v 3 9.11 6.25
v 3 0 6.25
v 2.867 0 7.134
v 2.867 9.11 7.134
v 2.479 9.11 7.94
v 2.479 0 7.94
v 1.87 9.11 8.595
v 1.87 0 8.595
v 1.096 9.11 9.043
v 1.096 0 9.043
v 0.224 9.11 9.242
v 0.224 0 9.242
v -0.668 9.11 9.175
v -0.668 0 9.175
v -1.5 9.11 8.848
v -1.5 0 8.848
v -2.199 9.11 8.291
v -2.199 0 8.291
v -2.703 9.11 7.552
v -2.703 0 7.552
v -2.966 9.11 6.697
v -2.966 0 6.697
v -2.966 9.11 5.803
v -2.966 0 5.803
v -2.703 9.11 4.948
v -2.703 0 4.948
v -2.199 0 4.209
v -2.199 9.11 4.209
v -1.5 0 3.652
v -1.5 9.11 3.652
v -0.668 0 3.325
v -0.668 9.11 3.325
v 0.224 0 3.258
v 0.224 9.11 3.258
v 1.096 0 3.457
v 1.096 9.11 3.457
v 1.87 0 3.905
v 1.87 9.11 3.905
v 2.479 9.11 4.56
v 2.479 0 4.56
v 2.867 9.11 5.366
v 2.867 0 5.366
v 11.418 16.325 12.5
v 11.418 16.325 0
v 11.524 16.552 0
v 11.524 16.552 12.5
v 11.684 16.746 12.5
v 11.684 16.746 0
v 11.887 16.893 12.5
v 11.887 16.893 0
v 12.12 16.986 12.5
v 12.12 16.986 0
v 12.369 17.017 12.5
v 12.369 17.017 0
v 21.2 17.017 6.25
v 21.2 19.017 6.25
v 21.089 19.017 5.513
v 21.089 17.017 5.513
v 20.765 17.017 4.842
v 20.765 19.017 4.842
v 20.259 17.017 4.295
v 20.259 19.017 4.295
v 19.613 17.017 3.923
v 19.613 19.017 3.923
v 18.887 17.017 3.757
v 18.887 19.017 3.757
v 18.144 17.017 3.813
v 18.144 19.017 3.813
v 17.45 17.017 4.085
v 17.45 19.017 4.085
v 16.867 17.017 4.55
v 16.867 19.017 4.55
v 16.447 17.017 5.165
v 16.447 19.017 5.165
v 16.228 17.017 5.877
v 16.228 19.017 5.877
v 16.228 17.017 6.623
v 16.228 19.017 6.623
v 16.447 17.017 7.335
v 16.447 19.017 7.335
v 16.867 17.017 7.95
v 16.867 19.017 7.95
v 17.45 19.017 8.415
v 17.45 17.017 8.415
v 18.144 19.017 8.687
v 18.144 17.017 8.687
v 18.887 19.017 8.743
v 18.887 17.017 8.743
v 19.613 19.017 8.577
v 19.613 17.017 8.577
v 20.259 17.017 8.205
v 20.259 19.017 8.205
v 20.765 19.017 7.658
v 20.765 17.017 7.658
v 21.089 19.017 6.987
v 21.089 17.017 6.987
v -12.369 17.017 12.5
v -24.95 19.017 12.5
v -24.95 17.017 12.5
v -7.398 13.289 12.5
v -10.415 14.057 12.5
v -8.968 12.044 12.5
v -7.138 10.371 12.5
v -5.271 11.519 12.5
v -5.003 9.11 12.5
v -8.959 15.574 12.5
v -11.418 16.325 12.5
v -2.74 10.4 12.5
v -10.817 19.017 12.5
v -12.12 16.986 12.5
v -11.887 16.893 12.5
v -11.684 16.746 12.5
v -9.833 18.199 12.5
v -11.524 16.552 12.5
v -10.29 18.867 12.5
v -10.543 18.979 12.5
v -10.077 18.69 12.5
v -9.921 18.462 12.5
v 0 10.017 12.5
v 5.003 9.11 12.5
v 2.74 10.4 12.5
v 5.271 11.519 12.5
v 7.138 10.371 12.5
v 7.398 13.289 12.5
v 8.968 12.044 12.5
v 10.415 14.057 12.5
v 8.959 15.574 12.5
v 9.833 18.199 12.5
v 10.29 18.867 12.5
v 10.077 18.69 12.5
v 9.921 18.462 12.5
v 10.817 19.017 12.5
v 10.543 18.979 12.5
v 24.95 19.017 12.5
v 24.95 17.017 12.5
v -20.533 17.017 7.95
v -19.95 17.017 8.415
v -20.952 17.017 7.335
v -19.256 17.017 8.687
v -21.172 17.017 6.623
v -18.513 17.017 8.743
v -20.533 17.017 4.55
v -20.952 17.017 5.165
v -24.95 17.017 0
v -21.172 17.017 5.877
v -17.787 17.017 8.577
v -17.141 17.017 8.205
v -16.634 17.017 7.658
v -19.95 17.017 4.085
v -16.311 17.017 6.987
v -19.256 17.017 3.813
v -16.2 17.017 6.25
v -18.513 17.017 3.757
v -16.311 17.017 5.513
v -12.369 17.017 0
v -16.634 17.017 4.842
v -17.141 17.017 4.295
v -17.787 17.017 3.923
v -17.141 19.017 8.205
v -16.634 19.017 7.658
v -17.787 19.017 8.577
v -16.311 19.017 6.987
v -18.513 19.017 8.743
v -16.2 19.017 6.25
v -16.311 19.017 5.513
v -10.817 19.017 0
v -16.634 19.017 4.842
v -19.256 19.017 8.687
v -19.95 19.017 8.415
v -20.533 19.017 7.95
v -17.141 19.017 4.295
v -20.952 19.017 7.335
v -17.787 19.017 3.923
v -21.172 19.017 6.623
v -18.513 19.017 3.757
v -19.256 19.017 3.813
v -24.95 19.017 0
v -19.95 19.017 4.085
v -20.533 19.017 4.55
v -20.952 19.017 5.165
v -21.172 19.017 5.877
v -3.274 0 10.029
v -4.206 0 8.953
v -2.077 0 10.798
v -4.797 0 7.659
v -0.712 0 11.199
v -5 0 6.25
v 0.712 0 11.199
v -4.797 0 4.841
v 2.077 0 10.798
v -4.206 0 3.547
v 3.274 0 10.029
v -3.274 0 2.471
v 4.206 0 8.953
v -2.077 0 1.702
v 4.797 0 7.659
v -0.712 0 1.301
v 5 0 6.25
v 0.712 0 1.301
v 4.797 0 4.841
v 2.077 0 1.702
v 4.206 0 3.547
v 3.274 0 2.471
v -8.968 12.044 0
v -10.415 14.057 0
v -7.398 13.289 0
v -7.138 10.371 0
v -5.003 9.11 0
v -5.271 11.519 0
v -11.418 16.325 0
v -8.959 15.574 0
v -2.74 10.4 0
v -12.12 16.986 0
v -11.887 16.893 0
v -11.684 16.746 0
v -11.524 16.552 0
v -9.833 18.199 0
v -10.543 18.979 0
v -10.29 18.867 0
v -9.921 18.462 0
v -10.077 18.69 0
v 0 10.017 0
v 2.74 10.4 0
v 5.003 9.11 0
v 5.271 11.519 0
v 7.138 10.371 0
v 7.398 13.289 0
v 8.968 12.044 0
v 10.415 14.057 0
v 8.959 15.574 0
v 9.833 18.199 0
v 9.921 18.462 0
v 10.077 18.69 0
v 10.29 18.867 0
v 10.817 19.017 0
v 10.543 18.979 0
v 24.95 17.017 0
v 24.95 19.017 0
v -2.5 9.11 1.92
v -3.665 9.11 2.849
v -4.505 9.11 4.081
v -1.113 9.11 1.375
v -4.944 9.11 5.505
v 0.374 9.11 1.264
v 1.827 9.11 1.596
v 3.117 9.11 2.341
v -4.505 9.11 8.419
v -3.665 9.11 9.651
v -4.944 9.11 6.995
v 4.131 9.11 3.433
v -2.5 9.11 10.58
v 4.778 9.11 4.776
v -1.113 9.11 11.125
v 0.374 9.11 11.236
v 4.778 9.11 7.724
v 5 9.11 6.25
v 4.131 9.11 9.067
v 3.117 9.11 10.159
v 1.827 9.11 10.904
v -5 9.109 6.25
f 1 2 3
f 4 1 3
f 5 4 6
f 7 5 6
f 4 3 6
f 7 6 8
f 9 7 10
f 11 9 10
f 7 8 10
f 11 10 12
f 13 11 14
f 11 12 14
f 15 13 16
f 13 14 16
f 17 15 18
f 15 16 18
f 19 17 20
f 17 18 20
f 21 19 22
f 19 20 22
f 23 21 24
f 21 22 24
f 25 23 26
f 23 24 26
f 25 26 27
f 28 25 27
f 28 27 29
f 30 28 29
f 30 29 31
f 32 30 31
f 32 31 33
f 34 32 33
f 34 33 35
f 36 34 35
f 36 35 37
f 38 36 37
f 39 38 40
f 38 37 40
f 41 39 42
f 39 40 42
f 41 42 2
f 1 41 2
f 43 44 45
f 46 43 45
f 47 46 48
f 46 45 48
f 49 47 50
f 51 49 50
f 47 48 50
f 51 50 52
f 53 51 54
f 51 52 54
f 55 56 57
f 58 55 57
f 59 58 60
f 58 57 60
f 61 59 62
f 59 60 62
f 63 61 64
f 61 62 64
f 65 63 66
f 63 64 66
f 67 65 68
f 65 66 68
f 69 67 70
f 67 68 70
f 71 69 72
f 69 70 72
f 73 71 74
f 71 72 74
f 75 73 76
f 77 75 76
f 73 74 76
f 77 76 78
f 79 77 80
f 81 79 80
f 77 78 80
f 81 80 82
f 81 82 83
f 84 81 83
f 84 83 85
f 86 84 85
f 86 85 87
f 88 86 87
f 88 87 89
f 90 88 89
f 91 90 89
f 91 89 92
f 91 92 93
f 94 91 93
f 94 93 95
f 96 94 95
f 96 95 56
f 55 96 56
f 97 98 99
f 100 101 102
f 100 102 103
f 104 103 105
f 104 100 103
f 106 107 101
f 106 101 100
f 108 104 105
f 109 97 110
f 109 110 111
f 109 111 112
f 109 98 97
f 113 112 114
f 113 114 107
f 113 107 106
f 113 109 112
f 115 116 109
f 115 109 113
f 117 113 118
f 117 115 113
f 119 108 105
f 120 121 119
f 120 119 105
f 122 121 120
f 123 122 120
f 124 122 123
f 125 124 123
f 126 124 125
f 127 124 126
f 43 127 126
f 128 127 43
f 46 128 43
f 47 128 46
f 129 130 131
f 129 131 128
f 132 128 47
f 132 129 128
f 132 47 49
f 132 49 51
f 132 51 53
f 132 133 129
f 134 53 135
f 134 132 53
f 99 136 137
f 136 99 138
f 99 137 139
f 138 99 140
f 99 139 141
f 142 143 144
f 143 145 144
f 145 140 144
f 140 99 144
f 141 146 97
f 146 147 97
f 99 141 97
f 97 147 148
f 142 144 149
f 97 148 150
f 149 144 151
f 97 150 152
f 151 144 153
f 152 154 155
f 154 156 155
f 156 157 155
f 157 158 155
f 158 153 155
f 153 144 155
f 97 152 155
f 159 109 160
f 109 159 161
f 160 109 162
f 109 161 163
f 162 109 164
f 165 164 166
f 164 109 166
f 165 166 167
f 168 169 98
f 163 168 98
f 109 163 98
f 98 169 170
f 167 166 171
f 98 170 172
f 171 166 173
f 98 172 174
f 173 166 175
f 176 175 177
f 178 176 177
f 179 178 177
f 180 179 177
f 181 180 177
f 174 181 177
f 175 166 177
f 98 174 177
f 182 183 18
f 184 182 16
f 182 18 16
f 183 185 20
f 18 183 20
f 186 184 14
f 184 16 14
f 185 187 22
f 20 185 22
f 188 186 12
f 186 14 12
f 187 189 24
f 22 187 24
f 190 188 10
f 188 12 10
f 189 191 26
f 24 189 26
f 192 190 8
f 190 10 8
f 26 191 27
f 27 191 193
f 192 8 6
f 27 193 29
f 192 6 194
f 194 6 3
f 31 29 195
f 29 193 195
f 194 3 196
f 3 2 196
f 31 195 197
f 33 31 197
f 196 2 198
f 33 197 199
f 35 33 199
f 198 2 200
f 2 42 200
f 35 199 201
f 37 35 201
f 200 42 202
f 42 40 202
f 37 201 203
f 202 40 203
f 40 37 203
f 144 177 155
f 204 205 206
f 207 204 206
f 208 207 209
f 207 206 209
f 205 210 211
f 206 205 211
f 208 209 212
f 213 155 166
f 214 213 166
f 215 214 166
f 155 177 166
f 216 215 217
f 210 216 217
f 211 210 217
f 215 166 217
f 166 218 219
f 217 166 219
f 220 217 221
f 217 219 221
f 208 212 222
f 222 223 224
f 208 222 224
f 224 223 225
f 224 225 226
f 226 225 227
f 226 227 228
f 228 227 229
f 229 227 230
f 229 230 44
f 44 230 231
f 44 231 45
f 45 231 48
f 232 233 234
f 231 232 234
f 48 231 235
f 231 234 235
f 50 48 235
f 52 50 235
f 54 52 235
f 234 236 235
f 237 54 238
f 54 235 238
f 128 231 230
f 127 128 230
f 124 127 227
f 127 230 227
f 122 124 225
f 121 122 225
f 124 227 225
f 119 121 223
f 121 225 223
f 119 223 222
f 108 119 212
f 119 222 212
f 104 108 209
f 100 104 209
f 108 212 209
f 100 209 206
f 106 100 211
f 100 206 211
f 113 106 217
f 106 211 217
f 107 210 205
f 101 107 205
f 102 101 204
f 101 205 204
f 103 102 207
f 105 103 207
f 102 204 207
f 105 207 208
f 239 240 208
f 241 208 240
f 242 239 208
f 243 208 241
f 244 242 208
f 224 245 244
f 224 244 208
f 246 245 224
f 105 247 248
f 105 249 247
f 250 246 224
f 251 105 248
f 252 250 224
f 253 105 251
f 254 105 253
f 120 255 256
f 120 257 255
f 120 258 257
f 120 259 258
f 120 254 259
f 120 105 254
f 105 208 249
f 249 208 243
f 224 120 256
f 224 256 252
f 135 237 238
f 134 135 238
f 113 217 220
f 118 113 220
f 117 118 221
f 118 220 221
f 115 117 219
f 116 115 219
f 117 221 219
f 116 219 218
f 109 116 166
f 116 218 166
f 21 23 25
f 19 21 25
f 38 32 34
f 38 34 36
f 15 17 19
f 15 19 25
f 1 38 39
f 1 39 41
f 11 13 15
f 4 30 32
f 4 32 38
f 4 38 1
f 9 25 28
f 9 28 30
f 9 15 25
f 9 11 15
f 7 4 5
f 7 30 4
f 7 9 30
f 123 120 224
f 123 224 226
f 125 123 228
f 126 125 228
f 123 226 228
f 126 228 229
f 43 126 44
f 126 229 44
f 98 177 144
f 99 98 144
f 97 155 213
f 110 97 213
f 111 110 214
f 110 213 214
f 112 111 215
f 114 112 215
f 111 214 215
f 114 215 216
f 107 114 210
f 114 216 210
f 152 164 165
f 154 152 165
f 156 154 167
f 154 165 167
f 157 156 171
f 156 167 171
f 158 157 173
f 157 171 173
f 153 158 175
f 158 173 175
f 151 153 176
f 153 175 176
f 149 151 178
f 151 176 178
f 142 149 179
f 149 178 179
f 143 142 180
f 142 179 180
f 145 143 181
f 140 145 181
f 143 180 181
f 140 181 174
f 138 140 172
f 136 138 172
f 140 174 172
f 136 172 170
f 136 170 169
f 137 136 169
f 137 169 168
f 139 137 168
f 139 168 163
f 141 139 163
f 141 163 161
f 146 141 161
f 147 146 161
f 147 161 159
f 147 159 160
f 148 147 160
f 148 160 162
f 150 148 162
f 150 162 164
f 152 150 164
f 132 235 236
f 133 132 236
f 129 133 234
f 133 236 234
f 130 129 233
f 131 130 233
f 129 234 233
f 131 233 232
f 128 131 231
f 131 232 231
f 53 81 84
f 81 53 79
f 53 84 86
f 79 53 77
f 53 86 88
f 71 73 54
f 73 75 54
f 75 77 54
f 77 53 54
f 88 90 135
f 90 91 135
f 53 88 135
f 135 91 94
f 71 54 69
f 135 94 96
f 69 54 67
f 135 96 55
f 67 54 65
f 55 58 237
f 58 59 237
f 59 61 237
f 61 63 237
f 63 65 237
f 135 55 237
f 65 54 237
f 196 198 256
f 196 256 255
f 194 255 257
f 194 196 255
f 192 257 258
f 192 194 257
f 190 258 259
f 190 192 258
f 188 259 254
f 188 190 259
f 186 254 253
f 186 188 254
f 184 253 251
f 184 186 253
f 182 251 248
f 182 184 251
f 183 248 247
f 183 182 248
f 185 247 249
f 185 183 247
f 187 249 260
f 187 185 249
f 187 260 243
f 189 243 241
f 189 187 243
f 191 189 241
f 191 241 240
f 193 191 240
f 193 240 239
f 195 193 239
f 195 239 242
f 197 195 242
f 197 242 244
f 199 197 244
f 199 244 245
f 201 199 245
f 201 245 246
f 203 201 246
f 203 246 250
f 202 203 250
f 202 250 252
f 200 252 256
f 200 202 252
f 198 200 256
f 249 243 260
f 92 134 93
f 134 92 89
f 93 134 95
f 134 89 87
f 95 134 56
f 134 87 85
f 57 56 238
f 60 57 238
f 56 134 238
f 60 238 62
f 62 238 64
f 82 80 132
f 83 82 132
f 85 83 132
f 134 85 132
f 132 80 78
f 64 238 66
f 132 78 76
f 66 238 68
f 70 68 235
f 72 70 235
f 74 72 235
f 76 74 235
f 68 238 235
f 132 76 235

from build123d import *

# Parameters (mm, degrees)
BOSS_EXTRUDE1_DEPTH = 12.5
SKETCH4_OUTSIDE_W   = 62.868
SKETCH4_OUTSIDE_H   = 25.468
SKETCH4_OUTSIDE_R   = 5
CUT_EXTRUDE6_DEPTH  = 9.11
SKETCH5_R           = 3
CUT_EXTRUDE7_DEPTH  = 9.11
CUT_EXTRUDE8_REACH  = 21.017
SKETCH6_R           = 2.5


with BuildPart() as part:
    # Sketch1 → Boss-Extrude1 (new body)
    with BuildSketch(Plane.XY):
        with BuildLine():
            Line((-10.816653826, 19.01731952), (-19.949874371, 19.01731952))
            Line((-19.949874371, 19.01731952), (-24.949874371, 19.01731952))
            Line((-24.949874371, 19.01731952), (-24.949874371, 17.01731952))
            Line((-24.949874371, 17.01731952), (-19.949874371, 17.01731952))
            Line((-19.949874371, 17.01731952), (-12.369316877, 17.01731952))
            ThreePointArc((-12.369316877, 17.01731952), (-11.780968471, 16.82592706), (-11.417830963, 16.325011828))
            ThreePointArc((-11.417830963, 16.325011828), (-8.966906745, 12.042698311), (-5, 9.108607405))
            Line((-5, 9.108607405), (-5, 0))
            Line((-5, 0), (5, 0))
            Line((5, 0), (5, 9.108607405))
            ThreePointArc((5, 9.108607405), (8.966906745, 12.042698311), (11.417830963, 16.325011828))
            ThreePointArc((11.417830963, 16.325011828), (11.780968471, 16.82592706), (12.369316877, 17.01731952))
            Line((12.369316877, 17.01731952), (19.949874371, 17.01731952))
            Line((19.949874371, 17.01731952), (24.949874371, 17.01731952))
            Line((24.949874371, 17.01731952), (24.949874371, 19.01731952))
            Line((24.949874371, 19.01731952), (19.949874371, 19.01731952))
            Line((19.949874371, 19.01731952), (10.816653826, 19.01731952))
            ThreePointArc((10.816653826, 19.01731952), (10.177051677, 18.786025635), (9.83332166, 18.199137702))
            ThreePointArc((9.83332166, 18.199137702), (0, 10.01731952), (-9.83332166, 18.199137702))
            ThreePointArc((-9.83332166, 18.199137702), (-10.177051677, 18.786025635), (-10.816653826, 19.01731952))
        make_face()
    extrude(amount=BOSS_EXTRUDE1_DEPTH)

    # Sketch4 outside → Cut-Extrude6 (cut)
    with BuildSketch(Plane.XZ):
        with Locations((0, 6.25)):
            Rectangle(SKETCH4_OUTSIDE_W, SKETCH4_OUTSIDE_H)
        with Locations((0, 6.25)):
            Circle(SKETCH4_OUTSIDE_R, mode=Mode.SUBTRACT)
    extrude(amount=-CUT_EXTRUDE6_DEPTH, mode=Mode.SUBTRACT)

    # Sketch5 → Cut-Extrude7 (cut)
    with BuildSketch(Plane.XZ):
        with Locations((0, 6.25)):
            Circle(SKETCH5_R)
    extrude(amount=-CUT_EXTRUDE7_DEPTH, mode=Mode.SUBTRACT)

    # Sketch6 → Cut-Extrude8 (cut, up to next)
    with BuildSketch(Plane(origin=(0, 19.01731952, 0), x_dir=(1, 0, 0), z_dir=(0, 1, 0)), mode=Mode.PRIVATE) as cut_extrude8_sk1:
        with Locations((-18.699874371, -6.25)):
            Circle(SKETCH6_R)
    cut_extrude8_tool1 = extrude(cut_extrude8_sk1.sketch, amount=-CUT_EXTRUDE8_REACH, mode=Mode.PRIVATE) & part.part
    add(cut_extrude8_tool1.solids().sort_by_distance((-18.699874, 19.01732, 6.25))[0], mode=Mode.SUBTRACT)
    # Sketch6 → Cut-Extrude8 (cut, up to next)
    with BuildSketch(Plane(origin=(0, 19.01731952, 0), x_dir=(1, 0, 0), z_dir=(0, 1, 0)), mode=Mode.PRIVATE) as cut_extrude8_sk2:
        with Locations((18.699874371, -6.25)):
            Circle(SKETCH6_R)
    cut_extrude8_tool2 = extrude(cut_extrude8_sk2.sketch, amount=-CUT_EXTRUDE8_REACH, mode=Mode.PRIVATE) & part.part
    add(cut_extrude8_tool2.solids().sort_by_distance((18.699874, 19.01732, 6.25))[0], mode=Mode.SUBTRACT)


solid = part.part
